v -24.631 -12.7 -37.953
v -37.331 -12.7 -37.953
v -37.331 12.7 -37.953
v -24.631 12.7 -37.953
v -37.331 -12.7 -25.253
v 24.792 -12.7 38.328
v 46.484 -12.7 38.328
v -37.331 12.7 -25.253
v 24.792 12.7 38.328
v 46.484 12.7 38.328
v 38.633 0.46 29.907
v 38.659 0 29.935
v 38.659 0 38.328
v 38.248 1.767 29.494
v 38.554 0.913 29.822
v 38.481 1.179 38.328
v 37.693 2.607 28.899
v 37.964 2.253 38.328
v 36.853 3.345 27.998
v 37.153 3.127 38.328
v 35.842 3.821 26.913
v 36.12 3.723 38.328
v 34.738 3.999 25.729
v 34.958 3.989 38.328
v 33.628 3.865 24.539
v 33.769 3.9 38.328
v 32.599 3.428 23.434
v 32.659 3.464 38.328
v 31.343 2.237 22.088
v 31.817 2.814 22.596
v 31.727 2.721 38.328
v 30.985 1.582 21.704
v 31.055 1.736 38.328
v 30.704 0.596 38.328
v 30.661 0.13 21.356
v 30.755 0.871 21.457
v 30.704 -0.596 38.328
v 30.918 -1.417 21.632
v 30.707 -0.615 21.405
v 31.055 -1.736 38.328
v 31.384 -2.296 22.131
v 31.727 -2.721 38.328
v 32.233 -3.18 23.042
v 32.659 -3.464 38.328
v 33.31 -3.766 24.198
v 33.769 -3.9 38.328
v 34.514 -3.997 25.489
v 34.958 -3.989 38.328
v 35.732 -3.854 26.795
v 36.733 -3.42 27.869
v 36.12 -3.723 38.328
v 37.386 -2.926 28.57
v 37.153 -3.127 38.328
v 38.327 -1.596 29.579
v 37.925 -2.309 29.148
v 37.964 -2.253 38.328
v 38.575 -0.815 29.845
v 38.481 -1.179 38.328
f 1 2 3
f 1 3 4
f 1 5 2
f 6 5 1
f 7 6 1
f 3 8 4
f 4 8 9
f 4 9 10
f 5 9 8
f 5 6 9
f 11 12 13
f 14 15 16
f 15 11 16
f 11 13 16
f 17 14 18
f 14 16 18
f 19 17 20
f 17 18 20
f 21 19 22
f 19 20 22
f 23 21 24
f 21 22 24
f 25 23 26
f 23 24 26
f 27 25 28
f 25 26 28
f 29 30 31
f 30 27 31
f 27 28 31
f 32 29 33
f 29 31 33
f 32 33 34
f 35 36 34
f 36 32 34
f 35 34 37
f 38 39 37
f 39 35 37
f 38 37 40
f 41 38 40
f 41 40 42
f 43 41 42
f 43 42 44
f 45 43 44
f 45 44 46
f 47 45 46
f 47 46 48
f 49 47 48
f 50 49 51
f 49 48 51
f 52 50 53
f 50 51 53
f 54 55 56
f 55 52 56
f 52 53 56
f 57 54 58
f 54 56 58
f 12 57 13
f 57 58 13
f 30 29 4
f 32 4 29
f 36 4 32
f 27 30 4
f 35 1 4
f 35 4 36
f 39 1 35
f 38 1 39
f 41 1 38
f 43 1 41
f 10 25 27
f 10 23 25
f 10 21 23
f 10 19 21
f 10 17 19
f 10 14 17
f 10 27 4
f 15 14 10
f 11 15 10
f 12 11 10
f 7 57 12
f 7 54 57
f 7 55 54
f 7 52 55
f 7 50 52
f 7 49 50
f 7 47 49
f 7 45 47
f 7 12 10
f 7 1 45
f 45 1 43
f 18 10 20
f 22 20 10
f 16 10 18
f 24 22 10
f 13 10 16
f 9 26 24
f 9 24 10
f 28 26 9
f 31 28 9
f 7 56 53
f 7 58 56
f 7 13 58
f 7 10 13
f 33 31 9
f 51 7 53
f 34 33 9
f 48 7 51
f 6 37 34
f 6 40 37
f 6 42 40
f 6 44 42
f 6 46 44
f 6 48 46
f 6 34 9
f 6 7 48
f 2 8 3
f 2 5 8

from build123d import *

# Parameters (mm, degrees)
F1_DEPTH = 12.7
F2_R     = 4
F3_DEPTH = 25.4


with BuildPart() as f1:
    # F0 (on Front) → F1 (new body, symmetric)
    with BuildSketch(Plane.XZ):
        Polygon((-37.331276, -25.252699), (-37.331276, -37.952699), (-24.631276, -37.952699), (46.483805, 38.328189), (24.792205, 38.328189), align=None)
    extrude(amount=F1_DEPTH, both=True)

    # F2 (on face) → F3 (cut)
    with BuildSketch(Plane.XY.offset(38.328189)):
        with Locations((34.659129, 0)):
            Circle(F2_R)
    extrude(amount=-F3_DEPTH, mode=Mode.SUBTRACT)


solid = f1.part
